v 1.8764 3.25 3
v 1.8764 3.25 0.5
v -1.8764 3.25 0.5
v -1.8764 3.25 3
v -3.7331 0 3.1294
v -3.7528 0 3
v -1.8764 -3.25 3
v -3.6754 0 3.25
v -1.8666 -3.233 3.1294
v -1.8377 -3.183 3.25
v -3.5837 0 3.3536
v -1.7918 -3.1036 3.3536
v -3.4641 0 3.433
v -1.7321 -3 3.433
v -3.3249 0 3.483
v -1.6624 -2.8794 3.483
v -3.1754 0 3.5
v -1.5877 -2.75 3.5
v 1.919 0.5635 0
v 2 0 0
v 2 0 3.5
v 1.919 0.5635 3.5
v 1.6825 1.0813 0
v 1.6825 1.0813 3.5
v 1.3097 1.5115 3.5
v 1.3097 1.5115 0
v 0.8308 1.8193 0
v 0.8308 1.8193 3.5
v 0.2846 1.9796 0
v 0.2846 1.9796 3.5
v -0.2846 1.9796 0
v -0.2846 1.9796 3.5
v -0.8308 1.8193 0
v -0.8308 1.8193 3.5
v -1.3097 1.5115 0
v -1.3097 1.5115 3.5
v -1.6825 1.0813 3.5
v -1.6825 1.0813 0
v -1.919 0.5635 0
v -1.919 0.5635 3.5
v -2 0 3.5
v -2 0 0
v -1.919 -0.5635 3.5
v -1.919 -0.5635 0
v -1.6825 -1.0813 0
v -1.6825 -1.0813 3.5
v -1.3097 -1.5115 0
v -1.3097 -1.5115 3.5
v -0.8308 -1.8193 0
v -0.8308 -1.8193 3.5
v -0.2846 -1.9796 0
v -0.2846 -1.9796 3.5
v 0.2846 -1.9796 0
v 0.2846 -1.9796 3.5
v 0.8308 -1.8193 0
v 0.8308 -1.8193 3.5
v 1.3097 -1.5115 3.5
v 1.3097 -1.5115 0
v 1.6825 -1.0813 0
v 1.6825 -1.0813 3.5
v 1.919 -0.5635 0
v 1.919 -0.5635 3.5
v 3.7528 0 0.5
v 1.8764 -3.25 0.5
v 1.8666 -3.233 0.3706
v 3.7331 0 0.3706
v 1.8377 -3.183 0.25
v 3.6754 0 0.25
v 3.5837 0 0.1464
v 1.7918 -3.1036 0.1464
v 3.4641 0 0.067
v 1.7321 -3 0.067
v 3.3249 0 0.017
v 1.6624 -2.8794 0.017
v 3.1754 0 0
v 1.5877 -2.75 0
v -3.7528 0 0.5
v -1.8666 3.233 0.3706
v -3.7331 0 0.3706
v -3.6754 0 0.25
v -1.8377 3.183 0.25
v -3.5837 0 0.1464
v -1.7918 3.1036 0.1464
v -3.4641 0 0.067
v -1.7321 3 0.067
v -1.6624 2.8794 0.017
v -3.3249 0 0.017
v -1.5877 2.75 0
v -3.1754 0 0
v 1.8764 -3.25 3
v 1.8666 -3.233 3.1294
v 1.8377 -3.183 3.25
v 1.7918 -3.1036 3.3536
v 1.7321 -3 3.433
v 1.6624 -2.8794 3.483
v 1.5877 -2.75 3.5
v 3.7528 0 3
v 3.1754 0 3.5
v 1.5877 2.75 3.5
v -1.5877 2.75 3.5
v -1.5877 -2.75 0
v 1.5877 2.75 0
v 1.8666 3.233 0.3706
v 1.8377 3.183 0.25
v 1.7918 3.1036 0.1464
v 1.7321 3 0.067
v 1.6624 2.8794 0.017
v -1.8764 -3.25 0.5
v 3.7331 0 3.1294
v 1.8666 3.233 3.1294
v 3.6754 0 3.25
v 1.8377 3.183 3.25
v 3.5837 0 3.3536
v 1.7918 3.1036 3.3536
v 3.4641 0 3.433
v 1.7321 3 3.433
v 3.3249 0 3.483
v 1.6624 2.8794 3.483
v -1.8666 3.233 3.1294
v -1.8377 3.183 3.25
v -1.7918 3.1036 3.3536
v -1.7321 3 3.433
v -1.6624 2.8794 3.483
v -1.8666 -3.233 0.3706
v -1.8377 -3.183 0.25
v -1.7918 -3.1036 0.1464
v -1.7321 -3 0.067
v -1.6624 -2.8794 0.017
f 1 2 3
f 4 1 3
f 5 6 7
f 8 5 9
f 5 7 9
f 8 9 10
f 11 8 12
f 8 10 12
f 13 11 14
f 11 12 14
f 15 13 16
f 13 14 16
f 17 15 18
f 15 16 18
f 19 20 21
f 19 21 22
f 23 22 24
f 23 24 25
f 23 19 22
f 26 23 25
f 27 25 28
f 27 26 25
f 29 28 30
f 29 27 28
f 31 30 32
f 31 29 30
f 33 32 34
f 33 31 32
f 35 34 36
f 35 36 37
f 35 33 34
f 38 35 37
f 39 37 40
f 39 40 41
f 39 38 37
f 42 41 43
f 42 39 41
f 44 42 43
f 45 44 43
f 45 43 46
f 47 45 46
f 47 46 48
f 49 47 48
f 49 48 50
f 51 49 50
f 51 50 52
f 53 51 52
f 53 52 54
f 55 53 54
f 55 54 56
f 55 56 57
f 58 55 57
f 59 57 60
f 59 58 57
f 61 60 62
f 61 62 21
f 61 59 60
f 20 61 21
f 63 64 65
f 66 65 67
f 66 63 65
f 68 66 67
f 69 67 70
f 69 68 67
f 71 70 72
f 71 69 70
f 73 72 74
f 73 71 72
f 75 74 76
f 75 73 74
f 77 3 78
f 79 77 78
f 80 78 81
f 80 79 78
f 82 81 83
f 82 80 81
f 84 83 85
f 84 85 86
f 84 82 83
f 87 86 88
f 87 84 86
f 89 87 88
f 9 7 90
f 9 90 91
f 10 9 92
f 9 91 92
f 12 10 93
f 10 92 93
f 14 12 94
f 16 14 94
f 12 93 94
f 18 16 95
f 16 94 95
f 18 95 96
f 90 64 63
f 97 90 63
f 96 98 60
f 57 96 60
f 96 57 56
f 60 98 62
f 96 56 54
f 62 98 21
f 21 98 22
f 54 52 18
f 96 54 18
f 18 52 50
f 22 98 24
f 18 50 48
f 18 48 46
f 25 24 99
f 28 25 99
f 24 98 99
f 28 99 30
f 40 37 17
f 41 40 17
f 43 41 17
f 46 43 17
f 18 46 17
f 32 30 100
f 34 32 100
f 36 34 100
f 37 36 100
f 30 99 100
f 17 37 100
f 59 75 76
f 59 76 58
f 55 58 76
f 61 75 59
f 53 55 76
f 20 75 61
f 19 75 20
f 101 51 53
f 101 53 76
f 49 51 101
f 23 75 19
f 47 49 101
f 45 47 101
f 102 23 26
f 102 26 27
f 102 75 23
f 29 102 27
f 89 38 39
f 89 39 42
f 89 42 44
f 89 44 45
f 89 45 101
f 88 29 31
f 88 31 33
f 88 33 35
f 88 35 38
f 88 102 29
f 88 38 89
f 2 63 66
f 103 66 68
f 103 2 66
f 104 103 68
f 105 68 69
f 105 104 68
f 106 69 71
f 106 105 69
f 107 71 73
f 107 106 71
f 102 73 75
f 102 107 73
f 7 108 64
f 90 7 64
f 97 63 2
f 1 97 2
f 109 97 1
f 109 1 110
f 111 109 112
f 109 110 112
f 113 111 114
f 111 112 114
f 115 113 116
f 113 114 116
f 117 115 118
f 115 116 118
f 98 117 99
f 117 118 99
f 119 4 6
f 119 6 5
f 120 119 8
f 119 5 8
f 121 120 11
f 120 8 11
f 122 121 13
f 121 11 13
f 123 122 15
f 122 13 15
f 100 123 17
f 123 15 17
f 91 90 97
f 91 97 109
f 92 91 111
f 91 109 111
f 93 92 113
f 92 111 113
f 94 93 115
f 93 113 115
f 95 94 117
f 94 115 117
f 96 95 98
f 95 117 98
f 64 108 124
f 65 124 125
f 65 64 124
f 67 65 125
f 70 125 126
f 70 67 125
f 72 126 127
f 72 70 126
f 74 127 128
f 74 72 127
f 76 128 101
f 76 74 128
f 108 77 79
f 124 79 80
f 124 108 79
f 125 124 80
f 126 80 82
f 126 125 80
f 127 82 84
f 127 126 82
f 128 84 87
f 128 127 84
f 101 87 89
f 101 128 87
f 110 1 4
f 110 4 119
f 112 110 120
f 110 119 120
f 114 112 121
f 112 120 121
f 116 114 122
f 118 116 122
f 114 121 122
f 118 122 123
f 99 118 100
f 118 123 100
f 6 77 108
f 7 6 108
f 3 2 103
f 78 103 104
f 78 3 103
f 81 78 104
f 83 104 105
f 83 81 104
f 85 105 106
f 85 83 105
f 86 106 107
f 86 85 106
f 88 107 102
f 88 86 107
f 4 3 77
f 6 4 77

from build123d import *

# Parameters (mm, degrees)
SKETCH1_R           = 2
BOSS_EXTRUDE1_DEPTH = 3.5
FILLET1_R           = 0.5


with BuildPart() as part:
    # Sketch1 → Boss-Extrude1 (new body)
    with BuildSketch(Plane.XY):
        Polygon((-2.8145825622994267, 1.625000000000001), (-1.8763883748662844, 3.25), (0, 3.2500000000000004), (1.8763883748662837, 3.25), (2.8145825622994254, 1.6249999999999996), (3.752776749732567, -3.3e-16), (2.814582562299426, -1.6249999999999998), (1.876388374866284, -3.25), (0, -3.2500000000000004), (-1.876388374866284, -3.25), (-2.814582562299426, -1.6249999999999993), (-3.752776749732568, 8.7e-16), align=None)
        Circle(SKETCH1_R, mode=Mode.SUBTRACT)
    extrude(amount=BOSS_EXTRUDE1_DEPTH)

    # Fillet1
    fillet1_edges = [part.edges().sort_by_distance(p)[0] for p in [
        (-2.8145825622994263, 1.6250000000000004, 0),
        (-4.4e-16, 3.25, 0),
        (2.8145825622994254, 1.625, 0),
        (2.8145825622994254, -1.6250000000000002, 0),
        (0, -3.25, 3.5),
        (0, -3.25, 0),
        (-2.814582562299426, -1.6249999999999996, 0),
        (2.8145825622994254, -1.625, 3.5),
        (2.8145825622994254, 1.6249999999999998, 3.5),
        (-2.2e-16, 3.25, 3.5),
        (-2.8145825622994263, 1.6250000000000004, 3.5),
        (-2.814582562299426, -1.6249999999999996, 3.5),
    ]]
    fillet(fillet1_edges, radius=FILLET1_R)


solid = part.part
